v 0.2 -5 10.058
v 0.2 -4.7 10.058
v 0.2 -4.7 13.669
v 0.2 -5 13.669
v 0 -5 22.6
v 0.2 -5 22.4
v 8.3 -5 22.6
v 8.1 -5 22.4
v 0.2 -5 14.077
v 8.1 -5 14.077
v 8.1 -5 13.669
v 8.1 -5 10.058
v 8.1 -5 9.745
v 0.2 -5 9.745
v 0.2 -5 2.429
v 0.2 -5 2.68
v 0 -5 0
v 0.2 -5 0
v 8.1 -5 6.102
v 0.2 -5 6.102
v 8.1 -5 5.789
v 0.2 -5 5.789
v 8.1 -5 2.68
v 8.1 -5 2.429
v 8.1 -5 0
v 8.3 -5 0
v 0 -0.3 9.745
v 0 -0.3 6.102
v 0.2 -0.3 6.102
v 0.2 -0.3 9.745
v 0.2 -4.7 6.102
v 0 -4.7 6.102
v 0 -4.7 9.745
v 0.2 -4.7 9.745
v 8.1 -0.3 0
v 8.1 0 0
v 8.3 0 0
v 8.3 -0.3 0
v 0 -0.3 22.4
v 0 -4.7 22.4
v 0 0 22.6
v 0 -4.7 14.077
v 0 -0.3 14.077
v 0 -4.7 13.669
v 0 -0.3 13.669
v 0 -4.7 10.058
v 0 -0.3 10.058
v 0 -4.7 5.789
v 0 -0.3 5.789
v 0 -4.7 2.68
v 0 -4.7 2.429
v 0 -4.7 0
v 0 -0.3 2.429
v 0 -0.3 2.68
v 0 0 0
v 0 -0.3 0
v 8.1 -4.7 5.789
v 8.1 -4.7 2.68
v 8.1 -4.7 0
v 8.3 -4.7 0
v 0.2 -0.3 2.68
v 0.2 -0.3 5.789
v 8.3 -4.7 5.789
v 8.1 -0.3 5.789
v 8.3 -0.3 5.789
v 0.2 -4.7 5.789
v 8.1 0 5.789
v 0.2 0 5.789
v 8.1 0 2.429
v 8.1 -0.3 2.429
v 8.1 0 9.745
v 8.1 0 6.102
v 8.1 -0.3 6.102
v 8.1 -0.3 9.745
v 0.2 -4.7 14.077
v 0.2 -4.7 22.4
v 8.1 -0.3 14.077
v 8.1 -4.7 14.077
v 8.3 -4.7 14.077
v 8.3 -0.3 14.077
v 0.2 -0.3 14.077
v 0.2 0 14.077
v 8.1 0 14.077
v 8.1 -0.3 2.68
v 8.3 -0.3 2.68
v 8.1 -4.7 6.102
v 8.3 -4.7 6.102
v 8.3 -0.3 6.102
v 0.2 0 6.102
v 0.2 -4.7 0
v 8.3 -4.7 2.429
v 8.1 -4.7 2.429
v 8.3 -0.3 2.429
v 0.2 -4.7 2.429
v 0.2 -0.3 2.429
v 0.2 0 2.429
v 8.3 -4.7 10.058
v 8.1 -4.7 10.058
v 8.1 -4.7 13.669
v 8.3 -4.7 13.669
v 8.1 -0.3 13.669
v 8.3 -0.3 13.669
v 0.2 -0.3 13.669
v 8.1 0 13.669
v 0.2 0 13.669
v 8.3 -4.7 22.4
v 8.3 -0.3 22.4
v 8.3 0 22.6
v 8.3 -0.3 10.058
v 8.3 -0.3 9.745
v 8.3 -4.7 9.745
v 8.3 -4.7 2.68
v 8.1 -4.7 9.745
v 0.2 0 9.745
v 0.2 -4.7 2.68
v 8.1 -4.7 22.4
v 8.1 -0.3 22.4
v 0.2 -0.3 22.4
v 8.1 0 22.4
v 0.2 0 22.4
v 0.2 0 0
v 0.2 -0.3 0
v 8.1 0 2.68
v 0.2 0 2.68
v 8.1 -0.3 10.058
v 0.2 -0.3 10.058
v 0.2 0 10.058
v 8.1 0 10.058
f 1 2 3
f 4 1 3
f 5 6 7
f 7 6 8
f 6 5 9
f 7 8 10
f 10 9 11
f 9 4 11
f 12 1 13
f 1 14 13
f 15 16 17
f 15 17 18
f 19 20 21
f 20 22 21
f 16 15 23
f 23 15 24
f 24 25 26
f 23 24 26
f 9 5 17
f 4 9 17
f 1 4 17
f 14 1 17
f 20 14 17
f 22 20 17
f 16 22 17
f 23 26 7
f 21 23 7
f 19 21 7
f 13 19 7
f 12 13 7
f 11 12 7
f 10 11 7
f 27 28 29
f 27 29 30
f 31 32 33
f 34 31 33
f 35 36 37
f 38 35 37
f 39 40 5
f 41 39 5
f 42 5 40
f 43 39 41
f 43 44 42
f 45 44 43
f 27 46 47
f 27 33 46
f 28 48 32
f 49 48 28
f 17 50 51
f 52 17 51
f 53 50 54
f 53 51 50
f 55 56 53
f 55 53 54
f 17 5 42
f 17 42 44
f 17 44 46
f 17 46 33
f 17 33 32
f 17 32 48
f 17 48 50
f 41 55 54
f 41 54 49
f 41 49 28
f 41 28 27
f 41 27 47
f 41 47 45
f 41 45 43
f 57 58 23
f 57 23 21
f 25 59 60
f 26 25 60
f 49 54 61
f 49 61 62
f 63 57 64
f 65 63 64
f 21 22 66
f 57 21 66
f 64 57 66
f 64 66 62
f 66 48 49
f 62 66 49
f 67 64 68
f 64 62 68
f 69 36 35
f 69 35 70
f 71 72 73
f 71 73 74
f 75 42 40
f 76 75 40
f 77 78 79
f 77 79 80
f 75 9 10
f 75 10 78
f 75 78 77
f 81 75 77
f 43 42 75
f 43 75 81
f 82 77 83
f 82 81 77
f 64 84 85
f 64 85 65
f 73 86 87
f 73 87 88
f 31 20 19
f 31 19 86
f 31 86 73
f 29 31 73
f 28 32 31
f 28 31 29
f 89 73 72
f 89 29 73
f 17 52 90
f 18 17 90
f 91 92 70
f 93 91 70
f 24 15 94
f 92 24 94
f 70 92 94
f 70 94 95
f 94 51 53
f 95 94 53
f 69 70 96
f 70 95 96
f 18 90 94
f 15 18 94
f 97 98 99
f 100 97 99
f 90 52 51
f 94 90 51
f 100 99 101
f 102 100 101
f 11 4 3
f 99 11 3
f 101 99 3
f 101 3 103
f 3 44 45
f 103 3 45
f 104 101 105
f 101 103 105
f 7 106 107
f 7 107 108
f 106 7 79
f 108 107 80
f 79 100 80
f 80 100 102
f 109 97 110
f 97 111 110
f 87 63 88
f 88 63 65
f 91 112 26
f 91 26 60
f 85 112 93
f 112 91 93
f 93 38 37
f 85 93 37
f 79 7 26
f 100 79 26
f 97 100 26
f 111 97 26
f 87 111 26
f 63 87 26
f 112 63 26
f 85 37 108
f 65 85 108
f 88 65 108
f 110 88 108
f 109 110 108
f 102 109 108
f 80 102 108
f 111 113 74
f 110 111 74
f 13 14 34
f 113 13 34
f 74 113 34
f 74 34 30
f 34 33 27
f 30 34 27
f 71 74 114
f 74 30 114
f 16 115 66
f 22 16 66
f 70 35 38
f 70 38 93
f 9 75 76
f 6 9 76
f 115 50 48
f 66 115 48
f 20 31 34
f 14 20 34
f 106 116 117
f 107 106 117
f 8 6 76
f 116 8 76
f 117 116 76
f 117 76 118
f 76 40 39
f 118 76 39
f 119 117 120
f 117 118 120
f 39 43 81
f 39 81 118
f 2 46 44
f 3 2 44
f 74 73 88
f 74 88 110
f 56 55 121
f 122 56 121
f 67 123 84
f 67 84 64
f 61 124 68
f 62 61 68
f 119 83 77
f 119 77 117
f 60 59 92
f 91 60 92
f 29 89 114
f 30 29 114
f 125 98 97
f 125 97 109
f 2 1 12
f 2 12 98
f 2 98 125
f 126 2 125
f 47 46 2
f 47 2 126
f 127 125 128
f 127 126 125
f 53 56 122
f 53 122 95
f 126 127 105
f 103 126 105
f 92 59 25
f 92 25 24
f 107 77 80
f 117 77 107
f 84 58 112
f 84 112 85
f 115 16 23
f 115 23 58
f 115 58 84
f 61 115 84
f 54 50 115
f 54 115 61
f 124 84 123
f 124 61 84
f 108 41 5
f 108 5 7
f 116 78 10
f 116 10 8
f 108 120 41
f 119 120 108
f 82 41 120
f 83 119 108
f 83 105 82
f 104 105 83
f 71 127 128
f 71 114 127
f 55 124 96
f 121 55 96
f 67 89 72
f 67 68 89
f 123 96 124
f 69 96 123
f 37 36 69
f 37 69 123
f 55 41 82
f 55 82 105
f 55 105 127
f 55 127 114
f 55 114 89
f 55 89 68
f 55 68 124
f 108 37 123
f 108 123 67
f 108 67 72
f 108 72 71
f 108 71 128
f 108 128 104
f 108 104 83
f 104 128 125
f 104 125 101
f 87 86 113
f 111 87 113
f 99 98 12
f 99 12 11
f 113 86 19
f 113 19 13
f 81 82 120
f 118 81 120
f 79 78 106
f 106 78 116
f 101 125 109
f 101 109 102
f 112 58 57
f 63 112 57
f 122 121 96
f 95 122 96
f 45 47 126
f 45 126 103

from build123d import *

# Parameters (mm, degrees)
F0_W     = 8.3
F0_H     = 5
F1_DEPTH = 22.6
F2_W     = 7.9
F2_H     = 8.322741
F2_H_2   = 3.610624
F2_H_3   = 3.642021
F2_H_4   = 3.108276
F2_H_5   = 2.429072
F3_DEPTH = 25
F4_W     = 4.4
F4_H     = 8.322741
F4_H_2   = 3.610624
F4_H_3   = 3.642021
F4_H_4   = 3.108276
F4_H_5   = 2.429072
F5_DEPTH = 25


with BuildPart() as f1:
    # F0 (on Top) → F1 (new body)
    with BuildSketch(Plane.XY):
        with Locations((4.15, -2.5)):
            Rectangle(F0_W, F0_H)
    extrude(amount=F1_DEPTH)

    # F2 (on face) → F3 (cut)
    with BuildSketch(Plane(origin=(0, 0, 0), x_dir=(-1, 0, 0), z_dir=(0, 1, 0))):
        with Locations((-4.15, 18.238629)):
            Rectangle(F2_W, F2_H)
        with Locations((-4.15, 11.86379)):
            Rectangle(F2_W, F2_H_2)
        with Locations((-4.15, 7.9235)):
            Rectangle(F2_W, F2_H_3)
        with Locations((-4.15, 4.234384)):
            Rectangle(F2_W, F2_H_4)
        with Locations((-4.15, 1.214536)):
            Rectangle(F2_W, F2_H_5)
    extrude(amount=-F3_DEPTH, mode=Mode.SUBTRACT)

    # F4 (on Right) → F5 (cut)
    with BuildSketch(Plane.YZ):
        with Locations((-2.5, 18.238629)):
            Rectangle(F4_W, F4_H)
        with Locations((-2.5, 11.86379)):
            Rectangle(F4_W, F4_H_2)
        with Locations((-2.5, 7.9235)):
            Rectangle(F4_W, F4_H_3)
        with Locations((-2.5, 4.234384)):
            Rectangle(F4_W, F4_H_4)
        with Locations((-2.5, 1.214536)):
            Rectangle(F4_W, F4_H_5)
    extrude(amount=F5_DEPTH, mode=Mode.SUBTRACT)


solid = f1.part
